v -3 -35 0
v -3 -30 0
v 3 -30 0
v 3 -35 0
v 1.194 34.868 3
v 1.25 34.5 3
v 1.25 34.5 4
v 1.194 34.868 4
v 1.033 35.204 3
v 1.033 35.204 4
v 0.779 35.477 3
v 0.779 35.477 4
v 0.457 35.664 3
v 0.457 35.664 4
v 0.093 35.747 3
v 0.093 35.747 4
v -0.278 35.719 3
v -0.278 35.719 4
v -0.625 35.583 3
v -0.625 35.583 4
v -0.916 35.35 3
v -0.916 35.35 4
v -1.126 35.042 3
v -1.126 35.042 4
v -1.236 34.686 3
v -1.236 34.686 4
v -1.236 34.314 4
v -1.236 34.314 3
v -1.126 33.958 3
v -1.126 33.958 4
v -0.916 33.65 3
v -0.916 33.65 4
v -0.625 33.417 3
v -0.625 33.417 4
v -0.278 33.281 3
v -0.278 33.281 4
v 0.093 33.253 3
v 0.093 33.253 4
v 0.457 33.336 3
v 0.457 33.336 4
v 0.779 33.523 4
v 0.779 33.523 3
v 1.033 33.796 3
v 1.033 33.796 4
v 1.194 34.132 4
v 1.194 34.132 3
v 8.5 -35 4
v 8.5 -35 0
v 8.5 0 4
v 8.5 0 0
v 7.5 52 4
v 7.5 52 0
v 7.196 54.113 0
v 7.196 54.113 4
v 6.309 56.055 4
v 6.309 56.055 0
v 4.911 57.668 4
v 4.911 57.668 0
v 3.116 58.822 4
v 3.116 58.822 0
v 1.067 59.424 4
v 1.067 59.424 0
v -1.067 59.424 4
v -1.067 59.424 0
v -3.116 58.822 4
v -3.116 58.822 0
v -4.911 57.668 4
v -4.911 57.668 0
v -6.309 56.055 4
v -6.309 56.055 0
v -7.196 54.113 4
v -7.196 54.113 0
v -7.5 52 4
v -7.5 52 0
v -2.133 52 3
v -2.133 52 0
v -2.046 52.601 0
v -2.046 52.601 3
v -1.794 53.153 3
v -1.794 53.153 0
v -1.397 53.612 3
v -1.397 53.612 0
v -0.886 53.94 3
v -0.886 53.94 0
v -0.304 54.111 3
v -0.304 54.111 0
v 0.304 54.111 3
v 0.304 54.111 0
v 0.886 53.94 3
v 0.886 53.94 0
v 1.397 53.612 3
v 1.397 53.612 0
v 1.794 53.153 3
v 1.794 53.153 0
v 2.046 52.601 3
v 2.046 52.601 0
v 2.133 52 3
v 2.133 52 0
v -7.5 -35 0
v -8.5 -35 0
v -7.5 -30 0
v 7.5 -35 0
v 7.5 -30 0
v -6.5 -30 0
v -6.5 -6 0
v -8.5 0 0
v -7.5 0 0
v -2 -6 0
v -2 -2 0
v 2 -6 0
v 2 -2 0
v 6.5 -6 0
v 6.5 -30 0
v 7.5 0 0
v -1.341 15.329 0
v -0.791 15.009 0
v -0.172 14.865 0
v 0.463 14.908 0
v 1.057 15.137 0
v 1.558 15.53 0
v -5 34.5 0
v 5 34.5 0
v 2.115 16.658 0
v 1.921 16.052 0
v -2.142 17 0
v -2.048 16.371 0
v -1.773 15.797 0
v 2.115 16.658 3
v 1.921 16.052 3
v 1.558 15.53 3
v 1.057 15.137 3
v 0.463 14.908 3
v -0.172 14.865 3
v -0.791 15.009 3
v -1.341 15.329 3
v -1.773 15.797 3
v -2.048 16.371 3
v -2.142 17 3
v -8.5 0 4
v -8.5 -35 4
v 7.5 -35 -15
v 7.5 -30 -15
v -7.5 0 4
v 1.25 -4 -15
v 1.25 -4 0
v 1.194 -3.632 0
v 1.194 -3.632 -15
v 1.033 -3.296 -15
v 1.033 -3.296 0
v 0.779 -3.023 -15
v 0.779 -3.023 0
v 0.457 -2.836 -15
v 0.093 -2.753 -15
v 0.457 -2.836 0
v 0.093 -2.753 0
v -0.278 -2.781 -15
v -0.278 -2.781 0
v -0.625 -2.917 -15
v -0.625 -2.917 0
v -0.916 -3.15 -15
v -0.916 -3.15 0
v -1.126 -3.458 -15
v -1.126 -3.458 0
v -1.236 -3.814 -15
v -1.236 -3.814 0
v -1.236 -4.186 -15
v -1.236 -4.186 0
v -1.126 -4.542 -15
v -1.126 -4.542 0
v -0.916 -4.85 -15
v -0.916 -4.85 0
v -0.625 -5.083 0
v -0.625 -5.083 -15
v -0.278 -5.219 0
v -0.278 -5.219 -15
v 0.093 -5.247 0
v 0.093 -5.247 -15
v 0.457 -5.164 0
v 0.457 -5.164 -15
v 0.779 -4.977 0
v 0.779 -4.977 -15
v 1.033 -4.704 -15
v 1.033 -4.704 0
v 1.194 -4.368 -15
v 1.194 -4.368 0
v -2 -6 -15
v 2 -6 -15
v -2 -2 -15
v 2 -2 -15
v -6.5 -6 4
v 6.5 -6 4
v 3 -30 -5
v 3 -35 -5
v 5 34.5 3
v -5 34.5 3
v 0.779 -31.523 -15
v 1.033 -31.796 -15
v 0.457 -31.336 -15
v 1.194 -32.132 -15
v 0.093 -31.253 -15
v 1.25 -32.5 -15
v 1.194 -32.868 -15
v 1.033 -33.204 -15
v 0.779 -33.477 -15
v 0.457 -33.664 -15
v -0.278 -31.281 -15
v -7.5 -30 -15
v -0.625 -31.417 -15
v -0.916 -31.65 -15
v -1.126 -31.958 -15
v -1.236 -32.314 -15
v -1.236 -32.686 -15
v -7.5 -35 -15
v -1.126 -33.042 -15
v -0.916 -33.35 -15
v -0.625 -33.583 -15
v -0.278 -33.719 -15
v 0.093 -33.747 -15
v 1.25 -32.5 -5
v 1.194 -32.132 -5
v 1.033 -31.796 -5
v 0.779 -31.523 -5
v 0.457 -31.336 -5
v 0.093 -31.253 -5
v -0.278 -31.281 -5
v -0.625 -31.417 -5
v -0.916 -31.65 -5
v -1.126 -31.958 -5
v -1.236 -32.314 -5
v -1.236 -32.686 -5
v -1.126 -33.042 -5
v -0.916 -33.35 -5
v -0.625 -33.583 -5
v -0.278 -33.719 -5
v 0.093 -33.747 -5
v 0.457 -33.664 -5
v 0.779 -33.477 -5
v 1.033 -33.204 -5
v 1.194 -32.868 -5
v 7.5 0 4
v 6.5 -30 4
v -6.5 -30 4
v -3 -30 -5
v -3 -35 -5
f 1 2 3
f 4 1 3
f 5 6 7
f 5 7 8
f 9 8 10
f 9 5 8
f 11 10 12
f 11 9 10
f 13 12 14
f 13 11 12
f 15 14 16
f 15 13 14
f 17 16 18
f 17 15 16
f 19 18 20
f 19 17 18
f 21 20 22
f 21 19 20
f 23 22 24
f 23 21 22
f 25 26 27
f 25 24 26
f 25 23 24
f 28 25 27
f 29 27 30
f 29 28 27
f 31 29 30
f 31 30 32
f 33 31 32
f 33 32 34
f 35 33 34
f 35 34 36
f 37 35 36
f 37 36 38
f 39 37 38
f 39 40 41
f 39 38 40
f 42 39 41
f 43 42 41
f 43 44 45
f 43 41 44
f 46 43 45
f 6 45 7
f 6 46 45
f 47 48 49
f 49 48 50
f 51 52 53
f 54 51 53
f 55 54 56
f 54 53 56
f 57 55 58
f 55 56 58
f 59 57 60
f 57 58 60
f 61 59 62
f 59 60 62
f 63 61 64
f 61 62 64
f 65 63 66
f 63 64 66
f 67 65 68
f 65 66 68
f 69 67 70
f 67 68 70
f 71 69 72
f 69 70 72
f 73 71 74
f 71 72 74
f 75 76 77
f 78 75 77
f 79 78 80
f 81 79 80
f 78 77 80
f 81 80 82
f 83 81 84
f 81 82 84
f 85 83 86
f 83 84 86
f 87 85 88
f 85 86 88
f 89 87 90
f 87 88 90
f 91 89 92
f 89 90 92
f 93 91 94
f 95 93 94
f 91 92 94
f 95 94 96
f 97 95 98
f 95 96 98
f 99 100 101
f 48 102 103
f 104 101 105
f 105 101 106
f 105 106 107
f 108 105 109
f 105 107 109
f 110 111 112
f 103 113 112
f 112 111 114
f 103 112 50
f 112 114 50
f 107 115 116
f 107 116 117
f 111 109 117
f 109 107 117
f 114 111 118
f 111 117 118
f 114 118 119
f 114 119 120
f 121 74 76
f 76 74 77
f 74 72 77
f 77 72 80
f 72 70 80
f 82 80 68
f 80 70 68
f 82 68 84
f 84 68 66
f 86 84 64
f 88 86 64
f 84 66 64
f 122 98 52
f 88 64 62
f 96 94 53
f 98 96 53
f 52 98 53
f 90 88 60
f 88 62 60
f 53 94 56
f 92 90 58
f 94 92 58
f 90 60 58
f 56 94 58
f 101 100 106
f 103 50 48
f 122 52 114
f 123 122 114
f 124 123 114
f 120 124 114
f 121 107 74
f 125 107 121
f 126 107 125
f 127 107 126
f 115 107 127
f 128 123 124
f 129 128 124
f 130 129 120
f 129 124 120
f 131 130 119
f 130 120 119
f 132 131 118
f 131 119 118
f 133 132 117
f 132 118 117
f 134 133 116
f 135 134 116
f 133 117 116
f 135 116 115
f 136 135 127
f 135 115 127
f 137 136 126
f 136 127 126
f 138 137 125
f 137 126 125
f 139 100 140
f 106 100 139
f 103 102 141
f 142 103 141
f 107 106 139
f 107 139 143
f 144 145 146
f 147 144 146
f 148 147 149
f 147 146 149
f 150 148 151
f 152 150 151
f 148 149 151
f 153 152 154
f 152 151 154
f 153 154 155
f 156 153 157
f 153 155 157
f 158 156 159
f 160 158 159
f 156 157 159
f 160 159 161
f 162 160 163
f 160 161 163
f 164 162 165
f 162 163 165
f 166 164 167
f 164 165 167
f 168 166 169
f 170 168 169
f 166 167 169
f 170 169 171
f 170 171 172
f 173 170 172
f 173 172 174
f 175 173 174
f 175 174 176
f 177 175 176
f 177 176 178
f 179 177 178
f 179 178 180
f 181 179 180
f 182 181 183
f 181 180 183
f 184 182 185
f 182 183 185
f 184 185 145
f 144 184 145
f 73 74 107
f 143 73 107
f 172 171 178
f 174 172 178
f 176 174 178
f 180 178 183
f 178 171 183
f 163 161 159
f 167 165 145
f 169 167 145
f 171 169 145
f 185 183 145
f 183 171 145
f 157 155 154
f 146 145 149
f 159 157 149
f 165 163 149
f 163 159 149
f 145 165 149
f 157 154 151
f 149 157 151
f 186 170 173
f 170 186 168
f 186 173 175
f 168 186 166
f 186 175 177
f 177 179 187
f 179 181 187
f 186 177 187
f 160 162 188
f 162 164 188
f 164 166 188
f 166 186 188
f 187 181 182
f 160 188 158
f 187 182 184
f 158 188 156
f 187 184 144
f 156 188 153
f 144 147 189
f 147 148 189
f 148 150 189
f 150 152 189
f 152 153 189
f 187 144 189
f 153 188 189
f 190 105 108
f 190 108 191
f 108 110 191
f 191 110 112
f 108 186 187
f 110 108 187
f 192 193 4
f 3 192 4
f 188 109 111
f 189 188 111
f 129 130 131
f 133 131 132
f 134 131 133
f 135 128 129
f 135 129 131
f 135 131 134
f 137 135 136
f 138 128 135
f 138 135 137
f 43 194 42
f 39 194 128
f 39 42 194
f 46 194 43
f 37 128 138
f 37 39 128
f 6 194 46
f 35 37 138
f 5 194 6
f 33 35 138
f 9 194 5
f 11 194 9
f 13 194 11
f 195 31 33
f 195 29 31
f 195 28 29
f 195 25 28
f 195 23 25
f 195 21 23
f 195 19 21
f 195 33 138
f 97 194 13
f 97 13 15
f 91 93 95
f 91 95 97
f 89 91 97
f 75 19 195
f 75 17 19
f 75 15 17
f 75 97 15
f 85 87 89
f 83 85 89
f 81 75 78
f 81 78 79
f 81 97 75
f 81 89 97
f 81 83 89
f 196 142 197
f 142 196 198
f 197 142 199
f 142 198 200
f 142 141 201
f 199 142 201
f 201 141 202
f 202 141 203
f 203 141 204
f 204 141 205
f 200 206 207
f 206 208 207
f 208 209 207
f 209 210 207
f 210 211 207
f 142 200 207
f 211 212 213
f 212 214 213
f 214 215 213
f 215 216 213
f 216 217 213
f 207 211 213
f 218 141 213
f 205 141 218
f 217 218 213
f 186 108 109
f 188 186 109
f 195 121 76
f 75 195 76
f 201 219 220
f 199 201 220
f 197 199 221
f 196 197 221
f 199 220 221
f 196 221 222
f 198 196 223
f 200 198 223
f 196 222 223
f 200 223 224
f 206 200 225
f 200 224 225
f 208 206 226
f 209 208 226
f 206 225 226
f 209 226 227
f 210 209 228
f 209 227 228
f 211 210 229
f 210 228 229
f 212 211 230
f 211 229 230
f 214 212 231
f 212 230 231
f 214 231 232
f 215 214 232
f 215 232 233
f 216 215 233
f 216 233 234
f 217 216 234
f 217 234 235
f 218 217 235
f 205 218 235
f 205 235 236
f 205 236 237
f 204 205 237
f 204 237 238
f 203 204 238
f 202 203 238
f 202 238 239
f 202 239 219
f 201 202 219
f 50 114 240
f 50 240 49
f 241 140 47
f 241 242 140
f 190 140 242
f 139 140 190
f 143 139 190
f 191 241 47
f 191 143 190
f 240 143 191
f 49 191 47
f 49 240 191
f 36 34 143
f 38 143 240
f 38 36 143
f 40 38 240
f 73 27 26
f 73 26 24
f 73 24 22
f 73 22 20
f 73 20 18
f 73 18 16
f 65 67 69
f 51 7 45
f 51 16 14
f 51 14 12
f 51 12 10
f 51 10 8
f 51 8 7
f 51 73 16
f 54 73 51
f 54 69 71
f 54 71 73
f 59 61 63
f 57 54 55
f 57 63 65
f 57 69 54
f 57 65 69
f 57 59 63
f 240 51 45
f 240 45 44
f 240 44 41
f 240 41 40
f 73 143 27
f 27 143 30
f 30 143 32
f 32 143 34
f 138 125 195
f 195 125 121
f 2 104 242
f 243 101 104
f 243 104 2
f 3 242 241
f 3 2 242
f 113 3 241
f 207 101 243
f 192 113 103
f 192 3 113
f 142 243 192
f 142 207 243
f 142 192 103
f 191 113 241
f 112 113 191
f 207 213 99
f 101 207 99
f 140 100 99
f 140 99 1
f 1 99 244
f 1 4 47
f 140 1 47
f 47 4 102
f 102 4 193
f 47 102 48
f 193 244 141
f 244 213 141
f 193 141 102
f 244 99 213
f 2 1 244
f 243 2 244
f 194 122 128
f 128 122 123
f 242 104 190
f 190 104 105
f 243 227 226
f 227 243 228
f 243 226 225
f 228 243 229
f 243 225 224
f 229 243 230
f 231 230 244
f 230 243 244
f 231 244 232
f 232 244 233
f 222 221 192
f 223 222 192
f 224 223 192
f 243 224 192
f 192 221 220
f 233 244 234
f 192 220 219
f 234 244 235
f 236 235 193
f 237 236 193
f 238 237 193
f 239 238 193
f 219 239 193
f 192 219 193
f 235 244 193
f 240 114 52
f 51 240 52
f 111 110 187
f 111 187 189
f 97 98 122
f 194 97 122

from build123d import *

# Parameters (mm, degrees)
EXTRUDE_1_DEPTH     = 4
CUT_EXTRUDE_1_DEPTH = 3
SKETCH_5_R          = 1.25
CUT_EXTRUDE_2_DEPTH = 12.4
SKETCH_6_W          = 17
SKETCH_6_H          = 35
EXTRUDE_2_DEPTH     = 4
SKETCH_7_W          = 13
SKETCH_7_H          = 24
CUT_EXTRUDE_3_DEPTH = 12.1
SKETCH_8_W          = 4
SKETCH_8_H          = 4
SKETCH_8_R          = 1.25
EXTRUDE_3_DEPTH     = 15
EXTRUDE_4_DEPTH     = 5
SKETCH_10_R         = 1.25
CUT_EXTRUDE_4_DEPTH = 35


with BuildPart() as part:
    # 草圖1 → 填料-伸長1 (new body)
    with BuildSketch(Plane.XY):
        with BuildLine():
            Line((7.5, 0), (7.5, 52))
            ThreePointArc((7.5, 52), (0, 59.5), (-7.5, 52))
            Line((-7.5, 52), (-7.5, 0))
            Line((-7.5, 0), (7.5, 0))
        make_face()
    extrude(amount=EXTRUDE_1_DEPTH)

    # 草圖3 → 除料-伸長1 (cut)
    with BuildSketch(Plane.XY):
        with BuildLine():
            ThreePointArc((-2.132795501, 52), (0, 54.132795501), (2.132795501, 52))
            Line((2.132795501, 52), (5, 34.5))
            Line((5, 34.5), (2.114741289, 16.658021353))
            ThreePointArc((2.114741289, 16.658021353), (-0.171540182, 14.864665347), (-2.142213835, 17))
            Line((-2.142213835, 17), (-5, 34.5))
            Line((-5, 34.5), (-2.132795501, 52))
        make_face()
    extrude(amount=CUT_EXTRUDE_1_DEPTH, mode=Mode.SUBTRACT)

    # 草圖5 → 除料-伸長2 (cut)
    with BuildSketch(Plane.XY):
        with Locations((0, 34.5)):
            Circle(SKETCH_5_R)
    extrude(amount=CUT_EXTRUDE_2_DEPTH, mode=Mode.SUBTRACT)

    # 草圖6 → 填料-伸長2 (add)
    with BuildSketch(Plane.XY):
        with Locations((0, -17.5)):
            Rectangle(SKETCH_6_W, SKETCH_6_H)
    extrude(amount=EXTRUDE_2_DEPTH)

    # 草圖7 → 除料-伸長3 (cut)
    with BuildSketch(Plane.XY):
        with Locations((0, -18)):
            Rectangle(SKETCH_7_W, SKETCH_7_H)
    extrude(amount=CUT_EXTRUDE_3_DEPTH, mode=Mode.SUBTRACT)

    # 草圖8 → 填料-伸長3 (add)
    with BuildSketch(Plane.XY):
        with Locations((0, -4)):
            Rectangle(SKETCH_8_W, SKETCH_8_H)
        with Locations((0, -4)):
            Circle(SKETCH_8_R, mode=Mode.SUBTRACT)
    extrude(amount=-EXTRUDE_3_DEPTH)

    # 草圖9 → 填料-伸長4 (add)
    with BuildSketch(Plane(origin=(0, -35, 0), x_dir=(1, 0, 0), z_dir=(0, 1, 0))):
        Polygon((-7.5, 0), (-3, 0), (-3, 5), (3, 5), (3, 0), (7.5, 0), (7.5, 15), (-7.5, 15), align=None)
    extrude(amount=EXTRUDE_4_DEPTH)

    # 草圖10 → 除料-伸長4 (cut)
    with BuildSketch(Plane.XY):
        with Locations((0, -32.5)):
            Circle(SKETCH_10_R)
    extrude(amount=-CUT_EXTRUDE_4_DEPTH, mode=Mode.SUBTRACT)


solid = part.part
